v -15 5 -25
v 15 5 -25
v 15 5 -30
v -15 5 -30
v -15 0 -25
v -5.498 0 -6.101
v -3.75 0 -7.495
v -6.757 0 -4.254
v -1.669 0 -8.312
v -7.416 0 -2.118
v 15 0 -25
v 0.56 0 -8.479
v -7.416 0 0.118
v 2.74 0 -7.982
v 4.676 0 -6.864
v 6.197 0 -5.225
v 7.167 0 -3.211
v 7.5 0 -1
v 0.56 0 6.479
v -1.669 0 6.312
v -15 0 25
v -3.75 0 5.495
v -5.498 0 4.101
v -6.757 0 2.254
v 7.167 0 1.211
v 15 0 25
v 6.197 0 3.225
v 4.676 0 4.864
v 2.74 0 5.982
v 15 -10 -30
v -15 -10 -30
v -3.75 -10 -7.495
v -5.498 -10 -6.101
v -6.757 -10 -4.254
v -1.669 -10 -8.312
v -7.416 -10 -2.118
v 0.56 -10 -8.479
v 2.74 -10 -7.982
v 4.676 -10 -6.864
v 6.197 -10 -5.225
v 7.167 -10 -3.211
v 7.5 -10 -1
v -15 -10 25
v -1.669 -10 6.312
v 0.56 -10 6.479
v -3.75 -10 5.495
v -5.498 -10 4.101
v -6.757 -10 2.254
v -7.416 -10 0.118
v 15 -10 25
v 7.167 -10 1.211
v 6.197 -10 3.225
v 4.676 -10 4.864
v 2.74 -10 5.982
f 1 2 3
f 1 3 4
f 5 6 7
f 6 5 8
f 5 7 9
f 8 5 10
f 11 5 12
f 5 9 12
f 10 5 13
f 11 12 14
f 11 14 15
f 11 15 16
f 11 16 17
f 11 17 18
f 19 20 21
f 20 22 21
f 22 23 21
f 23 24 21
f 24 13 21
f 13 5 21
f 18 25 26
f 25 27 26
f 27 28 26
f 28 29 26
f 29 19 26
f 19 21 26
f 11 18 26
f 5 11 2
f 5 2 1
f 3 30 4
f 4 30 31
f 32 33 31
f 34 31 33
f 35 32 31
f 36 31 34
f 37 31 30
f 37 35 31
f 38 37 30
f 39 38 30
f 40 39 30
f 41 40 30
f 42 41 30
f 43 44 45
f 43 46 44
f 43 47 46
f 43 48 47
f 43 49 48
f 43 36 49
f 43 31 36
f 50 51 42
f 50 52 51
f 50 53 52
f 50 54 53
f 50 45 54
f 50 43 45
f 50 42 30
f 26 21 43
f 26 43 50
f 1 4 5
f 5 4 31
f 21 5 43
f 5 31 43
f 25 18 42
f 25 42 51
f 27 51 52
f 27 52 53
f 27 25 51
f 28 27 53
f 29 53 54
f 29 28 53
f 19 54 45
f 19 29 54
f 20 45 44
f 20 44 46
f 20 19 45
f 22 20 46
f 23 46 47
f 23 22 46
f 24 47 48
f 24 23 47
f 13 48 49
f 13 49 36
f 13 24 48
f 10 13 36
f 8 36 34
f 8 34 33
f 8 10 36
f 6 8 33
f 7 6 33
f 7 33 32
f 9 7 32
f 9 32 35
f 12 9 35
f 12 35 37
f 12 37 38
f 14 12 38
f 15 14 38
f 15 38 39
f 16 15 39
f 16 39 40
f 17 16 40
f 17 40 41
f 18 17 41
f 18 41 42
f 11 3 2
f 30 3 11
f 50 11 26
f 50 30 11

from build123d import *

# Parameters (mm, degrees)
F0_W       = 30
F0_H       = 50
F0_R       = 7.5
F0_H_2     = 5
F1_DEPTH   = 10
F2_W       = 30
F2_H       = 5
F1_FACE1_W = 30
F1_FACE1_H = 55
F1_FACE1_R = 7.5
F3_DEPTH   = 5


# Not quite as in the source:
# - a feature names something its author has since deleted; it is built from what else it names


with BuildPart() as f1:
    # F0 (on Front) → F1 (new body)
    with BuildSketch(Plane.XZ):
        Rectangle(F0_W, F0_H)
        with Locations((0, -1)):
            Circle(F0_R, mode=Mode.SUBTRACT)
        with Locations((0, -27.5)):
            Rectangle(F0_W, F0_H_2)
    extrude(amount=F1_DEPTH)

    # F2 (on face) + F1_face1 (on face) → F3 (join)
    with BuildSketch(Plane(origin=(0, 0, 0), x_dir=(-1, 0, 0), z_dir=(0, 1, 0))):
        with Locations((0, -27.5)):
            Rectangle(F2_W, F2_H)
    with BuildSketch(Plane(origin=(0, -10, -2.6799188927), x_dir=(1, 0, 0), z_dir=(0, -1, 0))):
        with Locations((0, 0.1799188927)):
            Rectangle(F1_FACE1_W, F1_FACE1_H)
        with Locations((0, 1.6799188927)):
            Circle(F1_FACE1_R, mode=Mode.SUBTRACT)
    extrude(amount=F3_DEPTH, dir=(0, 1, 0))


solid = f1.part
